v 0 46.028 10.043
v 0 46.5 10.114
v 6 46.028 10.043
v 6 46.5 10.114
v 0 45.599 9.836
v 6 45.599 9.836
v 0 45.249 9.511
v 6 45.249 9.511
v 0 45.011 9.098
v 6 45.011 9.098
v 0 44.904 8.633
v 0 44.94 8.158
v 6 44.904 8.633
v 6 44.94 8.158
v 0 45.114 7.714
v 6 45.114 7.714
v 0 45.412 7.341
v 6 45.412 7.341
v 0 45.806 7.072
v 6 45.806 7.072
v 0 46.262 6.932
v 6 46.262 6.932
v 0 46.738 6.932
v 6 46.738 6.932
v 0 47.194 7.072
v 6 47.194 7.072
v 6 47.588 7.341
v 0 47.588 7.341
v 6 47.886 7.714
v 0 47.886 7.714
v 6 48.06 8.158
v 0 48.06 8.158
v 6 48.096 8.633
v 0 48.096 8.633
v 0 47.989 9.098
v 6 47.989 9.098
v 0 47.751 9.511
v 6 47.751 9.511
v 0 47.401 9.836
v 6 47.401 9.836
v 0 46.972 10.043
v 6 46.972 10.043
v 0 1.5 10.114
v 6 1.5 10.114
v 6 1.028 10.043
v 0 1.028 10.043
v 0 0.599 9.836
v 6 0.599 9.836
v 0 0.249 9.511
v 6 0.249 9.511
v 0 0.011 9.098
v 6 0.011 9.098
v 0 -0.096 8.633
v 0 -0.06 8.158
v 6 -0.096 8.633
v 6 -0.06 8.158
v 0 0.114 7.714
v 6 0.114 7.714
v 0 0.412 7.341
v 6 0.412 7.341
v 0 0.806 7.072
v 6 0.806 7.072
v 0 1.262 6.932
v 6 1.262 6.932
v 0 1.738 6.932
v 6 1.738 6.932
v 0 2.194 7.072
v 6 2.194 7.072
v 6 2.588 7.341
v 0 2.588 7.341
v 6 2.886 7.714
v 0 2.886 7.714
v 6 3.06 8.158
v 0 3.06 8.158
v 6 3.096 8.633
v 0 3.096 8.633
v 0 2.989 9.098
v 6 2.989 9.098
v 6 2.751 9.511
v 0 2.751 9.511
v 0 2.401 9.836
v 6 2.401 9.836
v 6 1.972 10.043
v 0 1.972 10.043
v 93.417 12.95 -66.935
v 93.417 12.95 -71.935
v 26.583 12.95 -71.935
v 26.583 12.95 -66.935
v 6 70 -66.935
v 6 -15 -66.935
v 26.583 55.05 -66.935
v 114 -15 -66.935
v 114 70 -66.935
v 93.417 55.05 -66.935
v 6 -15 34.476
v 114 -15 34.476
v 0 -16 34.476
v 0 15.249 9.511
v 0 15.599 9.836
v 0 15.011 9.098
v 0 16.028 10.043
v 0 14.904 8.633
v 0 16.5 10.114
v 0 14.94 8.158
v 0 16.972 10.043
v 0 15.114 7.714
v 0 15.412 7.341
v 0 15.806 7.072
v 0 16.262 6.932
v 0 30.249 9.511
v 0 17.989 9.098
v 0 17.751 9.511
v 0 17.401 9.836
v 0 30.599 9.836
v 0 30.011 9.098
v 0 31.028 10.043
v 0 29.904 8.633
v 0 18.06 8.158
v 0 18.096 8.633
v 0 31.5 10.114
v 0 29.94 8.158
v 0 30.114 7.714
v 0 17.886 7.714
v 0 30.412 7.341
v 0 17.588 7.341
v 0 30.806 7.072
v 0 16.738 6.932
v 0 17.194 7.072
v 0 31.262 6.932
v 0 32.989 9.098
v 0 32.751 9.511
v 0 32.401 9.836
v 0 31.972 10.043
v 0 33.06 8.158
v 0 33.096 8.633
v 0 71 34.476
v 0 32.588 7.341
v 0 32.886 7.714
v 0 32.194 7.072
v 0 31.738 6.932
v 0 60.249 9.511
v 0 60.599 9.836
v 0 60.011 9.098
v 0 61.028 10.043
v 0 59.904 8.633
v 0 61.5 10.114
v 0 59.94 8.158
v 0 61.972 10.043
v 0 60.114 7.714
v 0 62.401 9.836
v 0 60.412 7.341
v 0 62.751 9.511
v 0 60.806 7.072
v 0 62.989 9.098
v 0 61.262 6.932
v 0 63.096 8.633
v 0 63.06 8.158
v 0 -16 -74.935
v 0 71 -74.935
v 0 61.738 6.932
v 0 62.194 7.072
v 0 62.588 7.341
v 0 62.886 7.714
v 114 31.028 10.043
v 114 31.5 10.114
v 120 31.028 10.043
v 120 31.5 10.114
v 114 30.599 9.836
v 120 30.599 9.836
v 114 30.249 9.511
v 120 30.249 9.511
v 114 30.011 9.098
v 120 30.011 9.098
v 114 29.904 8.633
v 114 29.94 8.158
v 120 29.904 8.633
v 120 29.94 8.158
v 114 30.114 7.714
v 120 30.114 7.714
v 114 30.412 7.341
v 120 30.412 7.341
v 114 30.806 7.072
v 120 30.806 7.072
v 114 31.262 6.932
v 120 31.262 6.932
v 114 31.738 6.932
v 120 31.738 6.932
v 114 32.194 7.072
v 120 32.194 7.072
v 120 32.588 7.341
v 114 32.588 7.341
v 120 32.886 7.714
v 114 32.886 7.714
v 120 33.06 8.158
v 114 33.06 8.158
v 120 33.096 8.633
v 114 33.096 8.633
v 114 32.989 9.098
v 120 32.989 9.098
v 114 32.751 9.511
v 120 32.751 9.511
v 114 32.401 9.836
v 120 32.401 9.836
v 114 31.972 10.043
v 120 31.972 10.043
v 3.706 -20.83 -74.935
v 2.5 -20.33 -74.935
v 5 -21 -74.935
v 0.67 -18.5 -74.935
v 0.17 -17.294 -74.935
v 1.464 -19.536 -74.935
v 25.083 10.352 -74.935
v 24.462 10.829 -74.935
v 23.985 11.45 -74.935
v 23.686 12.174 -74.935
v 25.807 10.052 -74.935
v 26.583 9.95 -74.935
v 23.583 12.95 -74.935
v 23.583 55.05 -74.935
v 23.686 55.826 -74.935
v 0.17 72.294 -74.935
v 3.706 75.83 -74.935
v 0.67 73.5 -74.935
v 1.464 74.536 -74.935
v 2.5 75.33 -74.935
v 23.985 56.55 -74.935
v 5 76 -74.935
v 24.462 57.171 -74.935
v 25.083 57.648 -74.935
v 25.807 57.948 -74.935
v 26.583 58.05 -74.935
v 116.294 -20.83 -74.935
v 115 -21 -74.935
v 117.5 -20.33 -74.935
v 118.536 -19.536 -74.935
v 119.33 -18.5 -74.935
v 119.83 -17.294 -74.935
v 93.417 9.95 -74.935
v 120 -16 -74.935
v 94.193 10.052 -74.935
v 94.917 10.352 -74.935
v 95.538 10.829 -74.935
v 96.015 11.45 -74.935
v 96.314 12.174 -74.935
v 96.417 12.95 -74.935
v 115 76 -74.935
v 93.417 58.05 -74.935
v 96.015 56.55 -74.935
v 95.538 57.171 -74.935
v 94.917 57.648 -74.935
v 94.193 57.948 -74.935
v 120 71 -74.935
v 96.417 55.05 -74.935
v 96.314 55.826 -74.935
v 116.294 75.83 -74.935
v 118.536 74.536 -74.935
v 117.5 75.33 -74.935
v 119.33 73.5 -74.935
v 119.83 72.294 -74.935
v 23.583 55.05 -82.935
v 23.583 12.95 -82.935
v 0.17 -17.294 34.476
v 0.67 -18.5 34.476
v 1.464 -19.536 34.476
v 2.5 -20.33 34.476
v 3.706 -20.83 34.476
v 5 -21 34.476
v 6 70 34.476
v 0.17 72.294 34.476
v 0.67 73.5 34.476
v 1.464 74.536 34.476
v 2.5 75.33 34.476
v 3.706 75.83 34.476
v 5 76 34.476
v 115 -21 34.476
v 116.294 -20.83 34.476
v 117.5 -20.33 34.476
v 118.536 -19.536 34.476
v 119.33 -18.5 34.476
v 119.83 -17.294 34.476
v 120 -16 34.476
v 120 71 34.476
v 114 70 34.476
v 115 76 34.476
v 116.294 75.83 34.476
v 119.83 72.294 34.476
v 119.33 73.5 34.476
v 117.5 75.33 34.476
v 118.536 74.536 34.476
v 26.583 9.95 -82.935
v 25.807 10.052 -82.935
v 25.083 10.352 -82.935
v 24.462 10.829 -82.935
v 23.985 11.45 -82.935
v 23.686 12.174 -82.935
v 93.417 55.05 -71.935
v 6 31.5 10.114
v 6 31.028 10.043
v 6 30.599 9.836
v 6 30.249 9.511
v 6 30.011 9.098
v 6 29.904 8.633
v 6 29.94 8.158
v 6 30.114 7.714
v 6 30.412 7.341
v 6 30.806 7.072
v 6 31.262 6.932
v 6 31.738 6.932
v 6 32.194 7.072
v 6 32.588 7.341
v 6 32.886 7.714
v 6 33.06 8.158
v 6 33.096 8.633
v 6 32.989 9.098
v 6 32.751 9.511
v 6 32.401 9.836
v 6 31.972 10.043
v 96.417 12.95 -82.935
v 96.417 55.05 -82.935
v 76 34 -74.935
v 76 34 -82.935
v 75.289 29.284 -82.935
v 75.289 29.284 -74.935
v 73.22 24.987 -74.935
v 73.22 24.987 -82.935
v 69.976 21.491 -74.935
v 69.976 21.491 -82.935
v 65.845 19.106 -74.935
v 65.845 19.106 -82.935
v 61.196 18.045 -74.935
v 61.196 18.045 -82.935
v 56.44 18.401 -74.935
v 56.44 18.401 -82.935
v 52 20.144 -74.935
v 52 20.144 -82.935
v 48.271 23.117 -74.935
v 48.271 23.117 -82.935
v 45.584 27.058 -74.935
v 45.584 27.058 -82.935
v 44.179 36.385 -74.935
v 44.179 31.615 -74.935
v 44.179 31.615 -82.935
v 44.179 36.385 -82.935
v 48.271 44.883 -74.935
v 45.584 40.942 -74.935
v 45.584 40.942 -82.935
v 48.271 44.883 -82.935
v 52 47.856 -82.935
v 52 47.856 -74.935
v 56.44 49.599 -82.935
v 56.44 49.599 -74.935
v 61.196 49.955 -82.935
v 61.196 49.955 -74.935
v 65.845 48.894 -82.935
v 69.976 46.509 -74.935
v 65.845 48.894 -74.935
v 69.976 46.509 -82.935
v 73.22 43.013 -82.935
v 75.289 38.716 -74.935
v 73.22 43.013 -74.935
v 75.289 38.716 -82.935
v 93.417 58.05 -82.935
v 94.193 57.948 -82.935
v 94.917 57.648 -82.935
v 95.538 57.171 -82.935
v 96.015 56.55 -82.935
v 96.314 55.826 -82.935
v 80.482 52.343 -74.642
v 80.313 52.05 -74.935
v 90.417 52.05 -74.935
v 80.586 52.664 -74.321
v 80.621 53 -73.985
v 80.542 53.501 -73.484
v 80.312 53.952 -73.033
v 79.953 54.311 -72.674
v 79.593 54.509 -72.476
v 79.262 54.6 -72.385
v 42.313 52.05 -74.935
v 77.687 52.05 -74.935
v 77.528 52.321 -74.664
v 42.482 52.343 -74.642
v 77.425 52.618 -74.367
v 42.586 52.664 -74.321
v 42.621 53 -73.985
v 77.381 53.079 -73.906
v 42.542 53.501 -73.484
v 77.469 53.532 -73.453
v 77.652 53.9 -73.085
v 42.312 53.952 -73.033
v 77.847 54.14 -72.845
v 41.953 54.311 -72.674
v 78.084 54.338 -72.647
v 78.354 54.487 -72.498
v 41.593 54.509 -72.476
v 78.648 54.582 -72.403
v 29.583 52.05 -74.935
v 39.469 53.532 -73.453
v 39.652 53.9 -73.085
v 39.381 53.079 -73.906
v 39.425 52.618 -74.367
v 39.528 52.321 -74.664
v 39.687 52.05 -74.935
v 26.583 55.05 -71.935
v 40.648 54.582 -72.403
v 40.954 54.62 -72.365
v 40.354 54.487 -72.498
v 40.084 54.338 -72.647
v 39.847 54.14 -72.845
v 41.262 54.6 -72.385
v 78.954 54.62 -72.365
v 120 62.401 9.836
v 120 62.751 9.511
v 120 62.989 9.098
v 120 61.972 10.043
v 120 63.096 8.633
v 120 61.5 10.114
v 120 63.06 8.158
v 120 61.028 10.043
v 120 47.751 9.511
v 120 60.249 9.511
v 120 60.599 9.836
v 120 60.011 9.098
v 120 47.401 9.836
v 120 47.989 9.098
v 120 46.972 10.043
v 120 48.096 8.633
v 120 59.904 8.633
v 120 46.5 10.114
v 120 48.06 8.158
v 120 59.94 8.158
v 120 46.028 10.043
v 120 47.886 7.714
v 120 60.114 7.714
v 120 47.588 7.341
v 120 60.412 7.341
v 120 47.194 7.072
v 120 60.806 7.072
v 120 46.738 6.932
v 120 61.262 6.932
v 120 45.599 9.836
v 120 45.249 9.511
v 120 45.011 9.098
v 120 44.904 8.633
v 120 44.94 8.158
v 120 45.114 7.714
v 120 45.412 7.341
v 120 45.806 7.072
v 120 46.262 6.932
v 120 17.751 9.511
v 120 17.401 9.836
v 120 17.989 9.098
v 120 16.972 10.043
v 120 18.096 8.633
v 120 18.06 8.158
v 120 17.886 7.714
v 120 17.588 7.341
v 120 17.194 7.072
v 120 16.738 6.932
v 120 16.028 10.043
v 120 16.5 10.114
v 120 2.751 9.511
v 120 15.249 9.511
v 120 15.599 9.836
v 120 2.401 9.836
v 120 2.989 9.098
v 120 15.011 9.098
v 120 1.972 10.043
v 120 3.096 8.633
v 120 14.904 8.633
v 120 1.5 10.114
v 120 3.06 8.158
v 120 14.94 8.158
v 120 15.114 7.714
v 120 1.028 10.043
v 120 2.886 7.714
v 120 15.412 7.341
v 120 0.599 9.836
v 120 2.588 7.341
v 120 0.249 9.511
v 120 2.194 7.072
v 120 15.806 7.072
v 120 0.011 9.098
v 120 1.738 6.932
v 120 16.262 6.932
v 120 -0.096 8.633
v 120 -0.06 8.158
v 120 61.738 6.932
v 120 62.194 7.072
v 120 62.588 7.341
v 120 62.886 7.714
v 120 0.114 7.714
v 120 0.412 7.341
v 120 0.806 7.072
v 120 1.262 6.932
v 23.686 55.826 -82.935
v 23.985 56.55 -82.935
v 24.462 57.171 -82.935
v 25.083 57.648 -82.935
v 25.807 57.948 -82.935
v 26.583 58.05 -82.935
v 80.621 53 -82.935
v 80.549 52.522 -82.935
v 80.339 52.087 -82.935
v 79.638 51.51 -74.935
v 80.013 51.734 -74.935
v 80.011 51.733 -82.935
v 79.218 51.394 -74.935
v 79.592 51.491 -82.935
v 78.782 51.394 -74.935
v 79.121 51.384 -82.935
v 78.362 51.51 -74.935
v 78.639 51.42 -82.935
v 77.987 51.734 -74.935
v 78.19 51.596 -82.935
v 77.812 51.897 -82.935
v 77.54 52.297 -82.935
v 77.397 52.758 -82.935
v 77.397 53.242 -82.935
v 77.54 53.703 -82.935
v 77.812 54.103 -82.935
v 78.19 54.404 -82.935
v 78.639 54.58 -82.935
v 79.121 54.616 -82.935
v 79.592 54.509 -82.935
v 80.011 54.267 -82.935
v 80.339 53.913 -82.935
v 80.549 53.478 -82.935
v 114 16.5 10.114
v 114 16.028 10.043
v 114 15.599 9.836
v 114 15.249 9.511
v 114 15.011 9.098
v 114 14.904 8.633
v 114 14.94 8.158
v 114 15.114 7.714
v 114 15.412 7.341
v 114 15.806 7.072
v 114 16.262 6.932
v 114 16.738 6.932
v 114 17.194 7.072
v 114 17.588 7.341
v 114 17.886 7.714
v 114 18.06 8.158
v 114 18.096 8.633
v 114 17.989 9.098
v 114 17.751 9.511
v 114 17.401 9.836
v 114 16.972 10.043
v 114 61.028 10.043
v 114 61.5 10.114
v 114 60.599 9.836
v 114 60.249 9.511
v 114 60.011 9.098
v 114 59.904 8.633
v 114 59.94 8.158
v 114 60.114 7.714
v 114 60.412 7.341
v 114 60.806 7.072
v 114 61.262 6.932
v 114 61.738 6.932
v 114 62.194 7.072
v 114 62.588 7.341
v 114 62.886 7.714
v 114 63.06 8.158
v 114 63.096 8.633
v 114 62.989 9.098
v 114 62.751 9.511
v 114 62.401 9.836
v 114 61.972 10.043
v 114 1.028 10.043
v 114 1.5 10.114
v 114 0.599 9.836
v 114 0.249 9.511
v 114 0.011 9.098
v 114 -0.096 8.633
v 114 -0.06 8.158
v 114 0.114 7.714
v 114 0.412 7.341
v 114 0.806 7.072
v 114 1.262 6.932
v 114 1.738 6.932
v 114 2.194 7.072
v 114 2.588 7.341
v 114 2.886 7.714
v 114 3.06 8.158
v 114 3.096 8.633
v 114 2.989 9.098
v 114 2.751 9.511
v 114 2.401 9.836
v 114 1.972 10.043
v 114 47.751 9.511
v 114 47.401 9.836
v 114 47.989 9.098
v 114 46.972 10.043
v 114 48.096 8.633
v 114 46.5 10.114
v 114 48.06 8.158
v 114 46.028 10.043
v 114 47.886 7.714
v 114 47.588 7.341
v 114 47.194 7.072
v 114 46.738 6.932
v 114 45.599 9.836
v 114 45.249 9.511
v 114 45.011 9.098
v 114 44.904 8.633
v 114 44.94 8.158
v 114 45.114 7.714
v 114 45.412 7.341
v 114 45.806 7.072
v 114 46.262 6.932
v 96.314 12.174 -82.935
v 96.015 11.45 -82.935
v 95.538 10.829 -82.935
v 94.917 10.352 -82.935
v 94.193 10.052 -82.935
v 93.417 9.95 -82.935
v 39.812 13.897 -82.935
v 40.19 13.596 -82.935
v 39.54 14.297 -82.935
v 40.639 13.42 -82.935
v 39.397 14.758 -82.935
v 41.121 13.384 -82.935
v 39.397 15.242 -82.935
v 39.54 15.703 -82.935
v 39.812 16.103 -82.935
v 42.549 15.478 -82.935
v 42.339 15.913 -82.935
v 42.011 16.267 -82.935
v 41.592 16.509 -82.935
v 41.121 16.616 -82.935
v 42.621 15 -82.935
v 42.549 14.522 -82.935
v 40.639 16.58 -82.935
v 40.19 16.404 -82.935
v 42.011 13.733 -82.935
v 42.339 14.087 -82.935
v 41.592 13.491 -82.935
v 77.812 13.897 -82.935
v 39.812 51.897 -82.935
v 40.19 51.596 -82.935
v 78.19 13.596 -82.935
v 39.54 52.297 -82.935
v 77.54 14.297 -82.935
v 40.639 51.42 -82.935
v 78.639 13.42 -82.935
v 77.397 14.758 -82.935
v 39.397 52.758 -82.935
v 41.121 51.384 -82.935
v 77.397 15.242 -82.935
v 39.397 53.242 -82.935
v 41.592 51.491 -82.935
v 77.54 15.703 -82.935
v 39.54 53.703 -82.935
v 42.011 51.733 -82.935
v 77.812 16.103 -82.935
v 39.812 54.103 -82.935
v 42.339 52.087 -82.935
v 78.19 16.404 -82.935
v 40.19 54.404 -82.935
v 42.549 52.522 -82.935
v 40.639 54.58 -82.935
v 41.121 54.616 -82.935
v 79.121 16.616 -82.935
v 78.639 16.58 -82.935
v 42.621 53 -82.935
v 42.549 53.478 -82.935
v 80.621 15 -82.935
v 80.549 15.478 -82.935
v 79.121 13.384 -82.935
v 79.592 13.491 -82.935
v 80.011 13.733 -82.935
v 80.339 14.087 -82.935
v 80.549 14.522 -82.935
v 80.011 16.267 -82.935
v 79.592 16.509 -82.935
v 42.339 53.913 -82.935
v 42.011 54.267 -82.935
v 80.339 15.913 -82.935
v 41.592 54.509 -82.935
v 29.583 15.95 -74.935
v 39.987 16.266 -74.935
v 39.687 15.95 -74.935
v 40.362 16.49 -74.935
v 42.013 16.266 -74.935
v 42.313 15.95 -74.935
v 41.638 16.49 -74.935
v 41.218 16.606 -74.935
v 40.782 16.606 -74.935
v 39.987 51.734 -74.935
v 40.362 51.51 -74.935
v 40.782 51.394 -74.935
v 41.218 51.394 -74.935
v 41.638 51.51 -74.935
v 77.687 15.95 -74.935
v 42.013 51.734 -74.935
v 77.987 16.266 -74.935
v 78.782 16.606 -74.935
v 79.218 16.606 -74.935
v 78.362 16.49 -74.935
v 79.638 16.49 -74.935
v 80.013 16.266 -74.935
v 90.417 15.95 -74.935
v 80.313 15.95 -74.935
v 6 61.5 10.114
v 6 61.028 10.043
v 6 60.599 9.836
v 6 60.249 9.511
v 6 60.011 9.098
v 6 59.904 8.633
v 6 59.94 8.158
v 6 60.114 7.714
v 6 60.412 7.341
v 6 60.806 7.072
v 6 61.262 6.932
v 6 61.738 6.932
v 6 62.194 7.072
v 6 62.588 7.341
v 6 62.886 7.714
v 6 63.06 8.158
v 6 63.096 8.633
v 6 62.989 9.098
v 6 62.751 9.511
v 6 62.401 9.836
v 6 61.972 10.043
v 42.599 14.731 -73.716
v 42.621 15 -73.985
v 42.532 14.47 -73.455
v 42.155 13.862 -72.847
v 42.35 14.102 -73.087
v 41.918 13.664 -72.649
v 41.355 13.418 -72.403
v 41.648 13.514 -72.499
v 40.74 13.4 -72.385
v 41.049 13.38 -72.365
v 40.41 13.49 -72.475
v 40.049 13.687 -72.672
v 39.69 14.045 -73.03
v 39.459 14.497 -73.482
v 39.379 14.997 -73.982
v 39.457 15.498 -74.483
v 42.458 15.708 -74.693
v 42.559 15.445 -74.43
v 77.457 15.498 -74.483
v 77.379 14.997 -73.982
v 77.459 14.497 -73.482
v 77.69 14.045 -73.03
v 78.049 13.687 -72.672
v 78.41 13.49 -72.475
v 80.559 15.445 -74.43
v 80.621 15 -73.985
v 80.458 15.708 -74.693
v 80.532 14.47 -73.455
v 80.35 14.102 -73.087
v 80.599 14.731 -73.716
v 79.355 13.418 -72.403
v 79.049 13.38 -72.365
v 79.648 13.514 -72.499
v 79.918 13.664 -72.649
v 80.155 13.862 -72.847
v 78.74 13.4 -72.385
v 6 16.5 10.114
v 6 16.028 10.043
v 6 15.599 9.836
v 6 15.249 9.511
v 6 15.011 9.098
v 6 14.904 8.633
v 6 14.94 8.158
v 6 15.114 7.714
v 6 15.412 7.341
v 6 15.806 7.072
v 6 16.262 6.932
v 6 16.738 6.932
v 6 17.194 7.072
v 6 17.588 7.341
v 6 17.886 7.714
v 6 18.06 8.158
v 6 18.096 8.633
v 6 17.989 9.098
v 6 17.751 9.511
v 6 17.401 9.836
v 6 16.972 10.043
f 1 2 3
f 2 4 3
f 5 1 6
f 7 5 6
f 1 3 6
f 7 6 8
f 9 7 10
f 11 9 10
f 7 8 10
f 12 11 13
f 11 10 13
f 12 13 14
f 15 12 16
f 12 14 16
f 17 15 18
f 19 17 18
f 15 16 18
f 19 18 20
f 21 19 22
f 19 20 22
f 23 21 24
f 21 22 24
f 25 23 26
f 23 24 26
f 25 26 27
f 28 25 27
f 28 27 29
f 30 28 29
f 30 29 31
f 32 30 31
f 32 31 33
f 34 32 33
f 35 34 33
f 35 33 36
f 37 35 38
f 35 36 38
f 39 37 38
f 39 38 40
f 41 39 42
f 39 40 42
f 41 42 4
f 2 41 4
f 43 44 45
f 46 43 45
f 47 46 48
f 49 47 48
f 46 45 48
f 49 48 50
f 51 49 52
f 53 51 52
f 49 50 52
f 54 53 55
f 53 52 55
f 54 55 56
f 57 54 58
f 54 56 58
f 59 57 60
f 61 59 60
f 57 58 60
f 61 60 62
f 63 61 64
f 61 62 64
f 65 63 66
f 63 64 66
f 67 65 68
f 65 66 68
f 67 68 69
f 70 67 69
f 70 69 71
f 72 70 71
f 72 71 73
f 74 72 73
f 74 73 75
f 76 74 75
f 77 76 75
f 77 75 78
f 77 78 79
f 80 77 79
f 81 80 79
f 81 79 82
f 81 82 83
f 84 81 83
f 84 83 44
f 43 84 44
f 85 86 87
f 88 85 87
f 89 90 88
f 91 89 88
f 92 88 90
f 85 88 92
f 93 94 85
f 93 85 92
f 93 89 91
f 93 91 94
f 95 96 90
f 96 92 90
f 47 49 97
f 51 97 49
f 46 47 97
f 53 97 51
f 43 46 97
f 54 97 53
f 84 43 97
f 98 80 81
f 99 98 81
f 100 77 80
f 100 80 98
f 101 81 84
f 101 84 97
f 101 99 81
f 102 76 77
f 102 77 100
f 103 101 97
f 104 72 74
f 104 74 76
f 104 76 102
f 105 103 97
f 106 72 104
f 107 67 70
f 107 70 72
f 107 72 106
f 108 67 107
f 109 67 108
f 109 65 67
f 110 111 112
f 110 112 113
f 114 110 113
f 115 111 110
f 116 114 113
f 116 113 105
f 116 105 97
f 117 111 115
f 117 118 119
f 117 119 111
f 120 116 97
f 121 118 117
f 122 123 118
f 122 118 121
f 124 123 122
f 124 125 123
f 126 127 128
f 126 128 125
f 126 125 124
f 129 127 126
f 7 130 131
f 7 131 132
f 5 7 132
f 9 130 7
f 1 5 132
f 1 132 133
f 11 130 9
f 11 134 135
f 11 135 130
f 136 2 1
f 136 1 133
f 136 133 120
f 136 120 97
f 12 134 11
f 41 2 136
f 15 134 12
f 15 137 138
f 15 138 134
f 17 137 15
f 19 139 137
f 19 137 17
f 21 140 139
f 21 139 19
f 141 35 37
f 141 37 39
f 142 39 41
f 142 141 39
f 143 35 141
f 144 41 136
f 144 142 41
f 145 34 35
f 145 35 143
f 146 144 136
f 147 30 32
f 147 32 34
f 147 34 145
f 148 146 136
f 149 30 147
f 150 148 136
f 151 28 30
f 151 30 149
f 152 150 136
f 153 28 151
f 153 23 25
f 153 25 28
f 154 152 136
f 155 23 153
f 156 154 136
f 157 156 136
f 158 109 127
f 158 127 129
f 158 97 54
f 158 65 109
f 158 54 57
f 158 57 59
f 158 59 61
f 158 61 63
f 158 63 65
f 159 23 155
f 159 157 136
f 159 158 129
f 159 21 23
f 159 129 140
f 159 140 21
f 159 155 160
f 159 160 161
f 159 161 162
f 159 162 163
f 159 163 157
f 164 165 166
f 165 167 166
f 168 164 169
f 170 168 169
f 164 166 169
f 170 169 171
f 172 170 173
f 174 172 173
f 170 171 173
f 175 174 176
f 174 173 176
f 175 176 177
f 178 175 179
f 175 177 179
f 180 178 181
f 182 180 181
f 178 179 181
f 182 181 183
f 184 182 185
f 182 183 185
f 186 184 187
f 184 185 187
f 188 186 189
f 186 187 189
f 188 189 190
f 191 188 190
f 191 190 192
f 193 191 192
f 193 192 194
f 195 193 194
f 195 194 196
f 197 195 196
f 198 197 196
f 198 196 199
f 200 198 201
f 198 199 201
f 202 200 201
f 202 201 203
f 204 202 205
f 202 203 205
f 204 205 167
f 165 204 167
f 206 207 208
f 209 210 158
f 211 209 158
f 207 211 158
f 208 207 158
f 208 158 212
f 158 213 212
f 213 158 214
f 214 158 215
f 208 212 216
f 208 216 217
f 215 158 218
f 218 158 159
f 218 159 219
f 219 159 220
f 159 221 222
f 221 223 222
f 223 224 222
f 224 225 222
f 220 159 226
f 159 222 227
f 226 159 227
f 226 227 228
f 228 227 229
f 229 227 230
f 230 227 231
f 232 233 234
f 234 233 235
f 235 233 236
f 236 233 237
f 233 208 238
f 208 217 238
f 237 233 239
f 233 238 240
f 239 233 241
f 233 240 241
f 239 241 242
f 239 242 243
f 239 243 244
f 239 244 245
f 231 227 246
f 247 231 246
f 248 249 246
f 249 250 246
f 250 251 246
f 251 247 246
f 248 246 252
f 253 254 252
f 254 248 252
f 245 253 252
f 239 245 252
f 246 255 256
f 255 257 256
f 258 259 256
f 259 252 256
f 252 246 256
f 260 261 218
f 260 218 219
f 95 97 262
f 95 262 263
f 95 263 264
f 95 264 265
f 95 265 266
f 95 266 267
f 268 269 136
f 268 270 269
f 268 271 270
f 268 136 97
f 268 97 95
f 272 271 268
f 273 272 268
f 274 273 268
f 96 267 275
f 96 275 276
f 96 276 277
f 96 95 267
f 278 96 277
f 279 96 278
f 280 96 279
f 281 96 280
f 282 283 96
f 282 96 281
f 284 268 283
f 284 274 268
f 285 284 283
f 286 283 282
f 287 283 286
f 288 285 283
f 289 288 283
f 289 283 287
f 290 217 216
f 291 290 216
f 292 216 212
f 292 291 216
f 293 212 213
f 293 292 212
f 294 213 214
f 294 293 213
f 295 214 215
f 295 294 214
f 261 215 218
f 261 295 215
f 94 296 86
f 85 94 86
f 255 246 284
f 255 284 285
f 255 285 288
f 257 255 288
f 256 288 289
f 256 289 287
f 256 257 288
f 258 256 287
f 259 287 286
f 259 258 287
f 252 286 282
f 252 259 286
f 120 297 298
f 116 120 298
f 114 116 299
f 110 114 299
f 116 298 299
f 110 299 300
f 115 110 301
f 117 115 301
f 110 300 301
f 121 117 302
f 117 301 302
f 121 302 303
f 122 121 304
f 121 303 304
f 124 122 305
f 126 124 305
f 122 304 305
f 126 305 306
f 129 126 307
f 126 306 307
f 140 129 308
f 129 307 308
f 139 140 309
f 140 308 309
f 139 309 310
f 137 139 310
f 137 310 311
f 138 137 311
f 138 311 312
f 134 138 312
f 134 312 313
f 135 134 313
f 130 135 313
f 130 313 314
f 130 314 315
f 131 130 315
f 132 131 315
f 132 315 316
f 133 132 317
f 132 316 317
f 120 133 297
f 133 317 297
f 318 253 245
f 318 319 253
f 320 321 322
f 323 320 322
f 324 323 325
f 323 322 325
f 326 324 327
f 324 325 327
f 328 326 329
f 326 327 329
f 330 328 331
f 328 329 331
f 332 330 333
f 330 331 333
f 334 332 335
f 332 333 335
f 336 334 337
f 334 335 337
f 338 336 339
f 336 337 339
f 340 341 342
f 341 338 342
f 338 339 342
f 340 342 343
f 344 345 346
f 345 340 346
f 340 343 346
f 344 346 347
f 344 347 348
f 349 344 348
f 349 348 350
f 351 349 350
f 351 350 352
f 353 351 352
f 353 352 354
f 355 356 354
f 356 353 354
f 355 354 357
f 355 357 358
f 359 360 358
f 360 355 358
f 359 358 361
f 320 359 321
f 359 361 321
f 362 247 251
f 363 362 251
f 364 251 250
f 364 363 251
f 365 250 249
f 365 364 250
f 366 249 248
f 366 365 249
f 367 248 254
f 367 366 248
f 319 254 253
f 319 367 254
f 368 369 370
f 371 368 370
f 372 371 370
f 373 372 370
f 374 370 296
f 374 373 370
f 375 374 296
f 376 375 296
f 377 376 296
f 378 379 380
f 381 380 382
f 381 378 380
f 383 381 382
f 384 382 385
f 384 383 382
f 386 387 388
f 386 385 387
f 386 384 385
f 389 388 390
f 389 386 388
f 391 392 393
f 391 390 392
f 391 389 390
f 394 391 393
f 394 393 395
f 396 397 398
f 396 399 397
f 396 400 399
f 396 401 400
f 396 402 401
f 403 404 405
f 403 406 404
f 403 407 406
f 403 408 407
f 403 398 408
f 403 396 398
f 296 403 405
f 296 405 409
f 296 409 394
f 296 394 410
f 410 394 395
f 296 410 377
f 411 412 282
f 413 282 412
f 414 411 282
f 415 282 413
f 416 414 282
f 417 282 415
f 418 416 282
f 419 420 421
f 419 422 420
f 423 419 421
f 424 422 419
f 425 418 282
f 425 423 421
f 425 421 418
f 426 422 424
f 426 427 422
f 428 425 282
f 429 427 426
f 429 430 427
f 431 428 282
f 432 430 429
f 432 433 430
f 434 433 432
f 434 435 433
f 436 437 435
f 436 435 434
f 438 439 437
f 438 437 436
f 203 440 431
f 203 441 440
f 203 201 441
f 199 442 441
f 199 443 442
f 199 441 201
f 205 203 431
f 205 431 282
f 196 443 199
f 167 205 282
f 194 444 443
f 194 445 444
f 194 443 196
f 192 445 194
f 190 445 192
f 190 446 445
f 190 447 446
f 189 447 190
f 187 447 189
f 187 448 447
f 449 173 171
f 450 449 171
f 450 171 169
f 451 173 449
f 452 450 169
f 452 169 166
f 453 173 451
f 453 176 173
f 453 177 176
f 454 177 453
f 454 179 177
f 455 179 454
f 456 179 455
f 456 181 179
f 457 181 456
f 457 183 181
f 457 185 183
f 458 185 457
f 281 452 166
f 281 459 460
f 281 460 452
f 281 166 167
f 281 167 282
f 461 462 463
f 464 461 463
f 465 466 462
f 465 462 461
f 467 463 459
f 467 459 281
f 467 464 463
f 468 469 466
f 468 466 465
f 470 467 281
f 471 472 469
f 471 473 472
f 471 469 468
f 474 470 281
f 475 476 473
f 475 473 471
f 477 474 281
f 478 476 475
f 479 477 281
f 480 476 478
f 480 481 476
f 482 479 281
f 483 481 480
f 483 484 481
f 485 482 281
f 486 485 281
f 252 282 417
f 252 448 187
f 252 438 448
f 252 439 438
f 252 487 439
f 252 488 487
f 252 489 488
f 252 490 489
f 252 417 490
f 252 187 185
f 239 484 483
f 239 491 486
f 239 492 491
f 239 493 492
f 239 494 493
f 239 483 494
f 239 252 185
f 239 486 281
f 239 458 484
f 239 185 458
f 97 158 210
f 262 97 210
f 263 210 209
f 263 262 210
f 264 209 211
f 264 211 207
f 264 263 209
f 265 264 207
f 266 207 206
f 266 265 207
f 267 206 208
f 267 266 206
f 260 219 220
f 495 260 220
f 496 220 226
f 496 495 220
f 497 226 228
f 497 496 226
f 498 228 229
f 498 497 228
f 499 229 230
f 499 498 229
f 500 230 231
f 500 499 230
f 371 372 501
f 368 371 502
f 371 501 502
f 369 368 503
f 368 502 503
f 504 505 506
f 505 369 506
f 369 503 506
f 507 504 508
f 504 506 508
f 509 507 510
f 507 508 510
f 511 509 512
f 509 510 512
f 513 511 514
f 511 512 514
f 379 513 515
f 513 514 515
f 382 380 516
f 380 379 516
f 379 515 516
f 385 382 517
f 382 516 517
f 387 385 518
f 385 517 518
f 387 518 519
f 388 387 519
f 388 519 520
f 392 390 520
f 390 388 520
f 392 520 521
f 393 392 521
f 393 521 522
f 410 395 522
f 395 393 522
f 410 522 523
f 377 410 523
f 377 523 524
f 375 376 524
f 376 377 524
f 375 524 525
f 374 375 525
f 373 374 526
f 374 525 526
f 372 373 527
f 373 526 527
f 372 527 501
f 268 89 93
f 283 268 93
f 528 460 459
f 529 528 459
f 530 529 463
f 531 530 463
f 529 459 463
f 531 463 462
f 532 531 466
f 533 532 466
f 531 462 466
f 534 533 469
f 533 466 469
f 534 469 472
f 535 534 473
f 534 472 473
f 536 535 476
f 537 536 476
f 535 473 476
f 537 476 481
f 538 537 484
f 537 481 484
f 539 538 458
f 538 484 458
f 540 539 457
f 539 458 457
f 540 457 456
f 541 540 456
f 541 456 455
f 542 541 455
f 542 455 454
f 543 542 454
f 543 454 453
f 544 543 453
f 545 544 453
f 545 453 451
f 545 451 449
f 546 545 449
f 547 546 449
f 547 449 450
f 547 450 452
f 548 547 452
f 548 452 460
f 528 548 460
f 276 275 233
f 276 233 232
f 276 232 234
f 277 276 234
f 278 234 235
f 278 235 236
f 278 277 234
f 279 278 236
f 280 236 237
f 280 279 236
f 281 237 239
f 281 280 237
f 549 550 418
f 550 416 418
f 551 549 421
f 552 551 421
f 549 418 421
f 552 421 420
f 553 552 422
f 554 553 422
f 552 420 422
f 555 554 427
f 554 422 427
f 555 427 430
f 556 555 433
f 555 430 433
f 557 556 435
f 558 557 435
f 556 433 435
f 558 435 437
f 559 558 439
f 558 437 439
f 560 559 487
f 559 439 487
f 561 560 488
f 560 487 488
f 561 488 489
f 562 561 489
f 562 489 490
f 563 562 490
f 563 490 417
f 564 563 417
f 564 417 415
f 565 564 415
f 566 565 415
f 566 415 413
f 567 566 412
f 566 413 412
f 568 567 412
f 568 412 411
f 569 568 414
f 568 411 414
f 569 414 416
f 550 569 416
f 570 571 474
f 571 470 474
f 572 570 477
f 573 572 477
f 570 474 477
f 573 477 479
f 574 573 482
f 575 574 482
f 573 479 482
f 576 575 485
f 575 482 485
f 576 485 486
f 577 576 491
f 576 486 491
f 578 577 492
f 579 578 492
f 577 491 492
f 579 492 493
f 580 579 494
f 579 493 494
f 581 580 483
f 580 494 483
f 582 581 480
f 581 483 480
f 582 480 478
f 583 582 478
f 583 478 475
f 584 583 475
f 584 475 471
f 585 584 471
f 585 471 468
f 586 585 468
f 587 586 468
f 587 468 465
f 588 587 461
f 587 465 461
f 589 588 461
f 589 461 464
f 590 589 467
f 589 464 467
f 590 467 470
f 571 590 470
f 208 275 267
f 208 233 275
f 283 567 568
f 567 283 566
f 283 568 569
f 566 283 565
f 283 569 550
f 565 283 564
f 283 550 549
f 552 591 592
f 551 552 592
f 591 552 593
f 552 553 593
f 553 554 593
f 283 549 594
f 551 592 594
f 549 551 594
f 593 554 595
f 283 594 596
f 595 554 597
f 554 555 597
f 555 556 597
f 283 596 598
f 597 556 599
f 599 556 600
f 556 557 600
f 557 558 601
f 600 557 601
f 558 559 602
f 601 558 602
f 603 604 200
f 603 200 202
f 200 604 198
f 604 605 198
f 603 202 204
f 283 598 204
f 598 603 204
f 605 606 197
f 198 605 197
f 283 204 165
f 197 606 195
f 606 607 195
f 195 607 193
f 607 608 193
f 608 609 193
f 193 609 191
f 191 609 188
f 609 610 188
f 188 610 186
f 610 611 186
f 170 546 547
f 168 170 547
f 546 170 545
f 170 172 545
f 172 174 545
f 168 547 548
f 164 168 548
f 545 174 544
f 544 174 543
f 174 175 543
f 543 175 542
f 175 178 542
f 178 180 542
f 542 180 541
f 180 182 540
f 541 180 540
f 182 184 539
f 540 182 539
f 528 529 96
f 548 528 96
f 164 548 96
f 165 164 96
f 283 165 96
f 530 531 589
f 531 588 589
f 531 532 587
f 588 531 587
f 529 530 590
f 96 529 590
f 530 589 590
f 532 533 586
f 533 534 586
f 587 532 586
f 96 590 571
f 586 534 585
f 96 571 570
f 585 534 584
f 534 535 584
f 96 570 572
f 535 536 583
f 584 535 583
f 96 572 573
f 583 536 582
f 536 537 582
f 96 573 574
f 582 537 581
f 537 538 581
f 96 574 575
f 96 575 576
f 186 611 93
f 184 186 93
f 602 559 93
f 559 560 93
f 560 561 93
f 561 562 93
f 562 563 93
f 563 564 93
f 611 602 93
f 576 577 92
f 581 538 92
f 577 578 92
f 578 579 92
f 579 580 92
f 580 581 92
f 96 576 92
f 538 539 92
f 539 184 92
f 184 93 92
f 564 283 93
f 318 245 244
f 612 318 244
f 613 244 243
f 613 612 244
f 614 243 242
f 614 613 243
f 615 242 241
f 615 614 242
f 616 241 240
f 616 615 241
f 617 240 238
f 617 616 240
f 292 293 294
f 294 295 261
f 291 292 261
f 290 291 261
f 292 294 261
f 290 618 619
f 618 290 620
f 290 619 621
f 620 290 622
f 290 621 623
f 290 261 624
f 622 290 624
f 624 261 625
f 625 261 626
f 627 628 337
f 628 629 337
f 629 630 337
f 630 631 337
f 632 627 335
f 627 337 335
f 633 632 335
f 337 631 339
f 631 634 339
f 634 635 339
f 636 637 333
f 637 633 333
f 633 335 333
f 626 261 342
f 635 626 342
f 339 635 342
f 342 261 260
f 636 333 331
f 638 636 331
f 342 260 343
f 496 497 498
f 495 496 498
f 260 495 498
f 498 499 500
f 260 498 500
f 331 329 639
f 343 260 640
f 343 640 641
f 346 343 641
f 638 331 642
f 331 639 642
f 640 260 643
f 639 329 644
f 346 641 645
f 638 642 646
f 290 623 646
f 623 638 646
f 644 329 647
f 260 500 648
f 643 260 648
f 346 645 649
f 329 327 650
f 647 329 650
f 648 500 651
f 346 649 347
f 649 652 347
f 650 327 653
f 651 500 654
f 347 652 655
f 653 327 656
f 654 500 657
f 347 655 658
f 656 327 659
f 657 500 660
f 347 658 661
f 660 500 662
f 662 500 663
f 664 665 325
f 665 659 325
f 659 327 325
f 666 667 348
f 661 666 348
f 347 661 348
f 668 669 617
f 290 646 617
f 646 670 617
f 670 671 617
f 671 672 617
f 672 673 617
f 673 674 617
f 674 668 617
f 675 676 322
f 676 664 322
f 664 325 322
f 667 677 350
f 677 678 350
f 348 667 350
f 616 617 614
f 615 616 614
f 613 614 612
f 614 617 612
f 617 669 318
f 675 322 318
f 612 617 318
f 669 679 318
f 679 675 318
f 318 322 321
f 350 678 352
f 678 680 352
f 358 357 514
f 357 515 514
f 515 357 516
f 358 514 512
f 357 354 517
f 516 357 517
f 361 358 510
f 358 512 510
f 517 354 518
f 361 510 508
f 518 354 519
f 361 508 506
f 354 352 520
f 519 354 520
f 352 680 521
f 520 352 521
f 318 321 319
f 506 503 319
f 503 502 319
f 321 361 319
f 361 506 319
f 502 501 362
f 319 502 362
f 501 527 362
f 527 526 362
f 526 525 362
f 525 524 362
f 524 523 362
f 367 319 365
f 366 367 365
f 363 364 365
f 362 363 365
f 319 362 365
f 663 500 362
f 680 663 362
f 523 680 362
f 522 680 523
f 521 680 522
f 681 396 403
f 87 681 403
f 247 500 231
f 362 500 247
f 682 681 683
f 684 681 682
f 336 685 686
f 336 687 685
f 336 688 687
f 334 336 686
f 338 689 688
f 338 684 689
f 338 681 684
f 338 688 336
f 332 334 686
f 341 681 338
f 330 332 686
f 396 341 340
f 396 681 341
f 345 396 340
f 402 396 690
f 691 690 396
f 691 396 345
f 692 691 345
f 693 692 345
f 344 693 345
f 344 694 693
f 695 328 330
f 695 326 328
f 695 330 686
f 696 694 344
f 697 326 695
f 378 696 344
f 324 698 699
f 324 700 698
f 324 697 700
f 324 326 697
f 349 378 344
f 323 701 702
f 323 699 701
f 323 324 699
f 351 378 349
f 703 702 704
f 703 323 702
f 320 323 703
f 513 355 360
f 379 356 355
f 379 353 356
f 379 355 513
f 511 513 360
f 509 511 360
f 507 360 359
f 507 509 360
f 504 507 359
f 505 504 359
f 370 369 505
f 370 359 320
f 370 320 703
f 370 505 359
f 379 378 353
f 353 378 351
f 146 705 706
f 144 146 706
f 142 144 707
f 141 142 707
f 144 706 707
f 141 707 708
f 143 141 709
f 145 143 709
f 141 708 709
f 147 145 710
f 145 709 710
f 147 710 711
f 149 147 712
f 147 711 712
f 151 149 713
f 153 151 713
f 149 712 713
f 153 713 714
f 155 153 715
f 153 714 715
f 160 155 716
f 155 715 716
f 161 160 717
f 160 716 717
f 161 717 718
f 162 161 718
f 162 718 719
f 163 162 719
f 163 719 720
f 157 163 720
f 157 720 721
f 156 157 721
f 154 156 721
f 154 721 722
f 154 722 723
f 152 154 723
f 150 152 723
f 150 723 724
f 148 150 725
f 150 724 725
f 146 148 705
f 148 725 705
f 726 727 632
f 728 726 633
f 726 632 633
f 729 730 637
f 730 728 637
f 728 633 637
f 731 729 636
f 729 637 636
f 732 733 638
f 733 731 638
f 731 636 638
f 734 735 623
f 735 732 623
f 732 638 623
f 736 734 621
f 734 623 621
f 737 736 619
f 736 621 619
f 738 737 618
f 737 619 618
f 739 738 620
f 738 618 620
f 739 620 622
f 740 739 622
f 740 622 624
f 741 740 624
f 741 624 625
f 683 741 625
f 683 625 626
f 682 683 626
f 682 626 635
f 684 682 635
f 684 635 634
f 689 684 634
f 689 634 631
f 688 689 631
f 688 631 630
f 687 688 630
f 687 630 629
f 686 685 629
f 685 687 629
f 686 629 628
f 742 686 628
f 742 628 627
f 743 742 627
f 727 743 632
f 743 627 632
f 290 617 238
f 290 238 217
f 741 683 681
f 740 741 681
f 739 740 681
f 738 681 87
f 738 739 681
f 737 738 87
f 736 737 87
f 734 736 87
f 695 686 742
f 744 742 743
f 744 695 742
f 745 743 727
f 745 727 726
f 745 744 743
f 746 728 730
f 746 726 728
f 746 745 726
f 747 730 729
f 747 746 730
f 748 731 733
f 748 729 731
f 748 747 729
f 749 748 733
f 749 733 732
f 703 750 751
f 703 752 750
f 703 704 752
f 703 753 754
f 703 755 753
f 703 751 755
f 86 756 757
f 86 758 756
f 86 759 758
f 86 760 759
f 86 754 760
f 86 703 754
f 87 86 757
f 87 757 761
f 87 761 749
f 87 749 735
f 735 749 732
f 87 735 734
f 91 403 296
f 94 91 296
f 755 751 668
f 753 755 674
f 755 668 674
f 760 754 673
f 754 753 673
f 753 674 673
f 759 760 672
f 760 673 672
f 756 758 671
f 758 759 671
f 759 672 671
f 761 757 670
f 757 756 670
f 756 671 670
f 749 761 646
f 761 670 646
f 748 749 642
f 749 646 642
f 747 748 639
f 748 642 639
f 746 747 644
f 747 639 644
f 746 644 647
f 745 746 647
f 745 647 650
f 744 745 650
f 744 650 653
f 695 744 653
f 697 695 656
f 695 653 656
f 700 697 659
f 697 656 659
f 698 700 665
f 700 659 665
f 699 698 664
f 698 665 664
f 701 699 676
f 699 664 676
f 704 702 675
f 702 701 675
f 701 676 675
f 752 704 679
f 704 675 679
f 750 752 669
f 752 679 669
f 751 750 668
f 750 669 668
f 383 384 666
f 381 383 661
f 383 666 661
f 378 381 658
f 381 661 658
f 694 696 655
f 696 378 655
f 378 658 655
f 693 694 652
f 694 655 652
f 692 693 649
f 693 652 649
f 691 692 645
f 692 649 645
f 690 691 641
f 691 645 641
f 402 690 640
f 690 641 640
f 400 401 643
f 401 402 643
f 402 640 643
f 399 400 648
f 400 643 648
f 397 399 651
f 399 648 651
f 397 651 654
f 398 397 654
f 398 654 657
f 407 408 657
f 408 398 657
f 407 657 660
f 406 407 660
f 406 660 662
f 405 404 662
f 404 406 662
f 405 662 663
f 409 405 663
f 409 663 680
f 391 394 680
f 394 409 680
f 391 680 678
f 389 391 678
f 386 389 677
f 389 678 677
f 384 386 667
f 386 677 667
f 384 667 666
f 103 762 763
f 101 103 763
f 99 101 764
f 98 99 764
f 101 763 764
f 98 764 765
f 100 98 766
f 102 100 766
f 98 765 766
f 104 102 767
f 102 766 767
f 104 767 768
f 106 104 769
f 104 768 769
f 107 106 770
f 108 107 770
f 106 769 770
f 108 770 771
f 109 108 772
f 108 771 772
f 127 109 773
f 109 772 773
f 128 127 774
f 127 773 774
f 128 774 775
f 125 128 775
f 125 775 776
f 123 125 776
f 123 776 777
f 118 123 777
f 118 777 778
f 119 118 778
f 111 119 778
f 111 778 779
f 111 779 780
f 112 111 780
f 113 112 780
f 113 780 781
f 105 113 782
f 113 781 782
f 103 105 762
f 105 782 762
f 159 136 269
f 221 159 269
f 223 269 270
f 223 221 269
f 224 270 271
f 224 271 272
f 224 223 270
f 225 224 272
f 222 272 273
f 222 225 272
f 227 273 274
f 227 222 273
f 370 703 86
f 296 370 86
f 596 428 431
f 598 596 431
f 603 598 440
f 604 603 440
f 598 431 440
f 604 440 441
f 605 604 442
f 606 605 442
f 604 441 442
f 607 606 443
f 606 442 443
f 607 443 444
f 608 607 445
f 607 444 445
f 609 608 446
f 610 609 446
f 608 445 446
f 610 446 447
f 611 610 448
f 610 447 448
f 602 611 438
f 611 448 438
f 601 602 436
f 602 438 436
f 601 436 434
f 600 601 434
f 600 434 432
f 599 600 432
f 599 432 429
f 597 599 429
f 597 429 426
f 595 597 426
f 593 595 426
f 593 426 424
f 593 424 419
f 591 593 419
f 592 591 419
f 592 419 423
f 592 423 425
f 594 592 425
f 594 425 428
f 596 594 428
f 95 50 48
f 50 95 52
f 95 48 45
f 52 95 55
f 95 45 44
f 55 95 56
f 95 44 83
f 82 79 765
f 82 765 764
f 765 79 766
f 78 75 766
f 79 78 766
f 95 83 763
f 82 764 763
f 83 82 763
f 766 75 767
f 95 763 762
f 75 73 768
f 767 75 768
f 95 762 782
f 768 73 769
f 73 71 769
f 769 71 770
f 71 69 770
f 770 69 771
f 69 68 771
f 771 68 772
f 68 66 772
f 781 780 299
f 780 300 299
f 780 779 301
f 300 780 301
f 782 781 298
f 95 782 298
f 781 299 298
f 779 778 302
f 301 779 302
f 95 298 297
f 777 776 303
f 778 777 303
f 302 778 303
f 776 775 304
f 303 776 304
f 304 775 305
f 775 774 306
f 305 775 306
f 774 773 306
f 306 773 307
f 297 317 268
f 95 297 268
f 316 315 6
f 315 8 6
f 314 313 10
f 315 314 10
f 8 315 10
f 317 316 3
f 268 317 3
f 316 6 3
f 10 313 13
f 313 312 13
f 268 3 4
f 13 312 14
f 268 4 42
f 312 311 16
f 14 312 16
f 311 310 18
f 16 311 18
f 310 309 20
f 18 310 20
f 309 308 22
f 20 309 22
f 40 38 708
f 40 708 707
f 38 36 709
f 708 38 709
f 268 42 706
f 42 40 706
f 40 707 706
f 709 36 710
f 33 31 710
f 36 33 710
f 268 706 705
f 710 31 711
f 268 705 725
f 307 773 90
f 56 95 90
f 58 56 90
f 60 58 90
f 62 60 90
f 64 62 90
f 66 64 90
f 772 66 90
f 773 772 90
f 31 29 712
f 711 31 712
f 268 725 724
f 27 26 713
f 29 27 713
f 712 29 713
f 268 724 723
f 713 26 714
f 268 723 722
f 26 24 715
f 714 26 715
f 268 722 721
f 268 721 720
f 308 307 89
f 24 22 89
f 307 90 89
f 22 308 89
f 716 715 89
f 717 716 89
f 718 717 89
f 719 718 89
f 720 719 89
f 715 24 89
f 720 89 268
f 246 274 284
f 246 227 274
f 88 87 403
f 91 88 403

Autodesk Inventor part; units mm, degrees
ref_plane "YZ Plane" through (0, 0, 0) normal (1, 0, 0) x (0, 1, 0)
ref_plane "XZ Plane" through (0, 0, 0) normal (0, 1, 0) x (-1, 0, 0)
ref_plane "XY Plane" through (0, 0, 0) normal (0, 0, 1) x (1, 0, 0)
ref_plane "Arbeitsebene3" through (60, 0, -82.935) normal (0, 0, 1) x (1, 0, 0)
sketch "Skizze13" plane through (60, 0, -82.935) normal (0, 0, 1) x (1, 0, 0)
  line L0 (-37.4166, 8.45) -> (-37.4166, 59.55) projected
  ellipse E0 centre (23.8014, -114.2521) end of major axis (147.0034, -54.0467) minor radius 137.1256 (-36.404, 8.95) -> (-37.4166, 8.45) ccw projected
  line L1 (-36.404, 8.95) -> (36.404, 8.95) projected
  ellipse E1 centre (-23.8014, -114.2521) end of major axis (98.9007, -175.47) minor radius 137.1256 (37.4166, 8.45) -> (36.404, 8.95) ccw projected
  line L2 (37.4166, 59.55) -> (37.4166, 8.45) projected
  ellipse E2 centre (-23.8014, 182.2521) end of major axis (-147.0034, 122.0467) minor radius 137.1256 (36.404, 59.05) -> (37.4166, 59.55) ccw projected
  line L3 (36.404, 59.05) -> (-36.404, 59.05) projected
  ellipse E3 centre (23.8014, 182.2521) end of major axis (-98.9007, 243.47) minor radius 137.1256 (-37.4166, 59.55) -> (-36.404, 59.05) ccw projected
  arc A0 (11.7926, 47.5991) -> (-11.7926, 47.5991) centre (0, 34) ccw projected
  arc A1 (13.5991, 45.7926) -> (11.7926, 47.5991) centre (15, 49) ccw projected
  arc A2 (13.5991, 22.2074) -> (13.5991, 45.7926) centre (0, 34) ccw projected
  arc A3 (11.7926, 20.4009) -> (13.5991, 22.2074) centre (15, 19) ccw projected
  arc A4 (-11.7926, 20.4009) -> (11.7926, 20.4009) centre (0, 34) ccw projected
  arc A5 (-13.5991, 22.2074) -> (-11.7926, 20.4009) centre (-15, 19) ccw projected
  arc A6 (-13.5991, 45.7926) -> (-13.5991, 22.2074) centre (0, 34) ccw projected
  arc A7 (-11.7926, 47.5991) -> (-13.5991, 45.7926) centre (-15, 49) ccw projected
  circle A8 centre (19, 15) radius 1.621 projected
  circle A9 centre (19, 53) radius 1.621 projected
  circle A10 centre (-19, 15) radius 1.621 projected
  circle A11 centre (-19, 53) radius 1.621 projected
  circle A12 centre (0, 34) radius 16
  line L4 (-33.4166, 58.05) -> (33.4166, 58.05)
  line L5 (36.4166, 55.05) -> (36.4166, 12.95)
  line L6 (33.4166, 9.95) -> (-33.4166, 9.95)
  line L7 (-36.4166, 12.95) -> (-36.4166, 55.05)
  arc A13 (-33.4166, 58.05) -> (-36.4166, 55.05) centre (-33.4166, 55.05) ccw
  arc A14 (-36.4166, 12.95) -> (-33.4166, 9.95) centre (-33.4166, 12.95) ccw
  arc A15 (33.4166, 9.95) -> (36.4166, 12.95) centre (33.4166, 12.95) ccw
  arc A16 (36.4166, 55.05) -> (33.4166, 58.05) centre (33.4166, 55.05) ccw
  point P0 (-60, 0)
  dimension "d147" = 32
  dimension "d148" = 1
  dimension "d149" = 3
extrude "Extrusion11" add sketch "Skizze13" along normal blind 8 contours A1 A2 A3 A4 A5 A6 A7 A0 | L4 A16 L5 A15 L6 A14 L7 A13
sketch "Skizze14" plane through (60, 0, -74.935) normal (0, 0, 1) x (1, 0, 0)
  point P0 (-60, 0)
sketch "Skizze15" plane through (60, 0, -74.935) normal (0, 0, 1) x (1, 0, 0)
  line L0 (-33.541, 7.75) -> (-33.541, 50.25)
  line L1 (-33.4166, 9.95) -> (33.4166, 9.95)
  arc A0 (33.4166, 9.95) -> (36.4166, 12.95) centre (33.4166, 12.95) ccw
  line L2 (36.4166, 12.95) -> (36.4166, 55.05)
  arc A1 (36.4166, 55.05) -> (33.4166, 58.05) centre (33.4166, 55.05) ccw
  line L3 (33.4166, 58.05) -> (-33.4166, 58.05)
  arc A2 (-33.4166, 58.05) -> (-36.4166, 55.05) centre (-33.4166, 55.05) ccw
  line L4 (-36.4166, 55.05) -> (-36.4166, 12.95)
  arc A3 (-36.4166, 12.95) -> (-33.4166, 9.95) centre (-33.4166, 12.95) ccw
  circle A4 centre (0, 34) radius 16
  circle A5 centre (-19, 53) radius 1.621
  circle A6 centre (-19, 15) radius 1.621
  circle A7 centre (19, 53) radius 1.621
  circle A8 centre (19, 15) radius 1.621
  line L5 (-77.5, 76.5) -> (77.5, 76.5)
  line L6 (-66, 79) -> (-60, 79)
  line L7 (66, -21) -> (66, 79)
  line L8 (-66, 79) -> (-66, -21)
  line L9 (-77.5, 107.3475) -> (77.5, 107.3475)
  line L10 (-33.4166, 9.95) -> (33.4166, 9.95)
  arc A9 (33.4166, 9.95) -> (36.4166, 12.95) centre (33.4166, 12.95) ccw
  line L11 (36.4166, 12.95) -> (36.4166, 55.05)
  arc A10 (36.4166, 55.05) -> (33.4166, 58.05) centre (33.4166, 55.05) ccw
  line L12 (33.4166, 58.05) -> (-33.4166, 58.05)
  arc A11 (-33.4166, 58.05) -> (-36.4166, 55.05) centre (-33.4166, 55.05) ccw
  line L13 (-36.4166, 55.05) -> (-36.4166, 12.95)
  arc A12 (-36.4166, 12.95) -> (-33.4166, 9.95) centre (-33.4166, 12.95) ccw
  circle A13 centre (0, 34) radius 16
  circle A14 centre (-19, 53) radius 1.621
  circle A15 centre (-19, 15) radius 1.621
  circle A16 centre (19, 53) radius 1.621
  circle A17 centre (19, 15) radius 1.621
  line L14 (-33.4166, 55.05) -> (33.4166, 55.05)
  line L15 (33.4166, 55.05) -> (33.4166, 12.95)
  line L16 (33.4166, 12.95) -> (-33.4166, 12.95)
  line L17 (-33.4166, 12.95) -> (-33.4166, 55.05)
  line L18 (60, -8) -> (-60, -8)
  line L19 (-60, -8) -> (-60, 76)
  line L20 (-60, 76) -> (60, 76)
  line L21 (60, 76) -> (60, -8)
  line L22 (60, -8) -> (-60, 76) construction
  line L23 (-60, -8) -> (60, 76) construction
  line L24 (-60, -8) -> (60, -8)
  line L25 (60, -8) -> (60, -21)
  line L26 (60, -21) -> (-60, -21)
  line L27 (-60, -21) -> (-60, -8)
  point P0 (-60, 0)
  point P1 (60, -8)
extrude "Extrusion12" add sketch "Skizze15" along normal blind 8 contours A3 L4 A2 L3 A1 L2 A0 L1 | L25 L26 L27 L18 | L18 L19 L20 L21
chamfer "Fasen1" distance 3 angle 45 4 edges at (93.4166, 34, -74.935) (60, 12.95, -74.935) (26.5834, 34, -74.935) (60, 55.05, -74.935)
sketch "Skizze16" plane through (60, 0, -66.935) normal (0, 0, 1) x (1, 0, 0)
  line L0 (60, 76) -> (-60, 76) projected
  line L1 (-60, 76) -> (-60, -21) projected
  line L2 (-60, -21) -> (60, -21) projected
  line L3 (60, -21) -> (60, 76) projected
  line L4 (-33.4166, 55.05) -> (33.4166, 55.05) projected
  line L5 (33.4166, 55.05) -> (33.4166, 12.95) projected
  line L6 (33.4166, 12.95) -> (-33.4166, 12.95) projected
  line L7 (-33.4166, 12.95) -> (-33.4166, 55.05) projected
  line L8 (-54, 70) -> (54, 70)
  line L9 (54, 70) -> (54, -15)
  line L10 (54, -15) -> (-54, -15)
  line L11 (-54, -15) -> (-54, 70)
  dimension "d163" = 6
extrude "Extrusion13" add sketch "Skizze16" along normal up to surface (101.4112 mm away) contours L3 L2 L1 L0
fillet "Rundung3" radius 5 4 edges at (0, 76, -20.2294) (120, 76, -20.2294) (0, -21, -20.2294) (120, -21, -20.2294)
sketch "Skizze17" plane through (0, -16, -74.935) normal (-1, 0, 0) x (0, 0, 1)
  circle A0 centre (83.4487, 47.5) radius 1.6 projected
  circle A1 centre (83.4487, 32.5) radius 1.6 projected
  circle A2 centre (83.4487, 62.5) radius 1.6 projected
  circle A3 centre (83.4487, 17.5) radius 1.6 projected
  circle A4 centre (83.4487, 77.5) radius 1.6 projected
  line L0 (168.1612, 6.4) -> (168.1612, 4) projected
  line L1 (168.1612, 4) -> (162.6612, 4) projected
  line L2 (162.6612, 4) -> (162.6612, 6.4) projected
  line L3 (162.6612, 6.4) -> (168.1612, 6.4) projected
  line L4 (128.1612, 6.4) -> (128.1612, 4) projected
  line L5 (128.1612, 4) -> (122.6612, 4) projected
  line L6 (122.6612, 4) -> (122.6612, 6.4) projected
  line L7 (122.6612, 6.4) -> (128.1612, 6.4) projected
  line L8 (170.6987, 83.6) -> (170.6987, 86) projected
  line L9 (170.6987, 86) -> (176.1987, 86) projected
  line L10 (176.1987, 86) -> (176.1987, 83.6) projected
  line L11 (176.1987, 83.6) -> (170.6987, 83.6) projected
  line L12 (96.1987, 86) -> (96.1987, 83.6) projected
  line L13 (96.1987, 83.6) -> (90.6987, 83.6) projected
  line L14 (90.6987, 83.6) -> (90.6987, 86) projected
  line L15 (90.6987, 86) -> (96.1987, 86) projected
  line L16 (193.4487, 87) -> (193.2487, 87) projected
  line L17 (193.2487, 87) -> (193.2487, 89) projected
  line L18 (193.4487, 89) -> (193.4487, 91.1929) projected
  line L19 (190.5112, 89) -> (180.3112, 89) projected
  line L20 (180.3112, 89) -> (188.3487, 95) projected
  line L21 (188.3487, 95) -> (178.5487, 95) projected
  line L22 (178.5487, 95) -> (170.5112, 89) projected
  line L23 (170.5112, 89) -> (160.3112, 89) projected
  line L24 (160.3112, 89) -> (168.3487, 95) projected
  line L25 (168.3487, 95) -> (158.5487, 95) projected
  line L26 (158.5487, 95) -> (150.5112, 89) projected
  line L27 (150.5112, 89) -> (140.3112, 89) projected
  line L28 (140.3112, 89) -> (148.3487, 95) projected
  line L29 (148.3487, 95) -> (138.5487, 95) projected
  line L30 (138.5487, 95) -> (130.5112, 89) projected
  line L31 (130.5112, 89) -> (120.3112, 89) projected
  line L32 (120.3112, 89) -> (128.3487, 95) projected
  line L33 (128.3487, 95) -> (118.5487, 95) projected
  line L34 (118.5487, 95) -> (110.5112, 89) projected
  line L35 (110.5112, 89) -> (100.3112, 89) projected
  line L36 (100.3112, 89) -> (108.3487, 95) projected
  line L37 (108.3487, 95) -> (98.5487, 95) projected
  line L38 (98.5487, 95) -> (90.5112, 89) projected
  line L39 (90.5112, 89) -> (80.3112, 89) projected
  line L40 (80.3112, 89) -> (88.3487, 95) projected
  line L41 (88.3487, 95) -> (78.4487, 95) projected
  line L42 (120.3112, -5) -> (120.3112, 1) projected
  line L43 (120.3112, 1) -> (130.5112, 1) projected
  line L44 (130.5112, 1) -> (130.5112, -5) projected
  line L45 (140.3112, -5) -> (140.3112, 1) projected
  line L46 (140.3112, 1) -> (150.5112, 1) projected
  line L47 (150.5112, 1) -> (150.5112, -5) projected
  line L48 (160.3112, -5) -> (160.3112, 1) projected
  line L49 (160.3112, 1) -> (170.5112, 1) projected
  line L50 (170.5112, 1) -> (170.5112, -5) projected
  line L51 (180.4112, -5) -> (180.4112, 1) projected
  line L52 (180.4112, 1) -> (185.4112, 1) projected
  line L53 (193.2487, 89) -> (193.4487, 89) projected
  line L54 (193.4487, 91.1929) -> (190.5112, 89) projected
  line L55 (78.4487, 95) -> (78.4487, -5) projected
  line L56 (78.4487, -5) -> (120.3112, -5) projected
  line L57 (130.5112, -5) -> (140.3112, -5) projected
  line L58 (150.5112, -5) -> (160.3112, -5) projected
  line L59 (170.5112, -5) -> (180.4112, -5) projected
  line L60 (185.4112, 1) -> (185.4112, -5) projected
  line L61 (185.4112, -5) -> (193.4487, -5) projected
  line L62 (193.4487, -5) -> (193.4487, 87) projected
  point P0 (74.935, 16)
hole "Bohrung3" at (0, 61.5, 8.5137) at (0, 46.5, 8.5137) at (0, 31.5, 8.5137) at (0, 16.5, 8.5137) at (0, 1.5, 8.5137) direction (1, 0, 0) diameter 3.2 end through all
properties part number "OpenFrameAdapter"
